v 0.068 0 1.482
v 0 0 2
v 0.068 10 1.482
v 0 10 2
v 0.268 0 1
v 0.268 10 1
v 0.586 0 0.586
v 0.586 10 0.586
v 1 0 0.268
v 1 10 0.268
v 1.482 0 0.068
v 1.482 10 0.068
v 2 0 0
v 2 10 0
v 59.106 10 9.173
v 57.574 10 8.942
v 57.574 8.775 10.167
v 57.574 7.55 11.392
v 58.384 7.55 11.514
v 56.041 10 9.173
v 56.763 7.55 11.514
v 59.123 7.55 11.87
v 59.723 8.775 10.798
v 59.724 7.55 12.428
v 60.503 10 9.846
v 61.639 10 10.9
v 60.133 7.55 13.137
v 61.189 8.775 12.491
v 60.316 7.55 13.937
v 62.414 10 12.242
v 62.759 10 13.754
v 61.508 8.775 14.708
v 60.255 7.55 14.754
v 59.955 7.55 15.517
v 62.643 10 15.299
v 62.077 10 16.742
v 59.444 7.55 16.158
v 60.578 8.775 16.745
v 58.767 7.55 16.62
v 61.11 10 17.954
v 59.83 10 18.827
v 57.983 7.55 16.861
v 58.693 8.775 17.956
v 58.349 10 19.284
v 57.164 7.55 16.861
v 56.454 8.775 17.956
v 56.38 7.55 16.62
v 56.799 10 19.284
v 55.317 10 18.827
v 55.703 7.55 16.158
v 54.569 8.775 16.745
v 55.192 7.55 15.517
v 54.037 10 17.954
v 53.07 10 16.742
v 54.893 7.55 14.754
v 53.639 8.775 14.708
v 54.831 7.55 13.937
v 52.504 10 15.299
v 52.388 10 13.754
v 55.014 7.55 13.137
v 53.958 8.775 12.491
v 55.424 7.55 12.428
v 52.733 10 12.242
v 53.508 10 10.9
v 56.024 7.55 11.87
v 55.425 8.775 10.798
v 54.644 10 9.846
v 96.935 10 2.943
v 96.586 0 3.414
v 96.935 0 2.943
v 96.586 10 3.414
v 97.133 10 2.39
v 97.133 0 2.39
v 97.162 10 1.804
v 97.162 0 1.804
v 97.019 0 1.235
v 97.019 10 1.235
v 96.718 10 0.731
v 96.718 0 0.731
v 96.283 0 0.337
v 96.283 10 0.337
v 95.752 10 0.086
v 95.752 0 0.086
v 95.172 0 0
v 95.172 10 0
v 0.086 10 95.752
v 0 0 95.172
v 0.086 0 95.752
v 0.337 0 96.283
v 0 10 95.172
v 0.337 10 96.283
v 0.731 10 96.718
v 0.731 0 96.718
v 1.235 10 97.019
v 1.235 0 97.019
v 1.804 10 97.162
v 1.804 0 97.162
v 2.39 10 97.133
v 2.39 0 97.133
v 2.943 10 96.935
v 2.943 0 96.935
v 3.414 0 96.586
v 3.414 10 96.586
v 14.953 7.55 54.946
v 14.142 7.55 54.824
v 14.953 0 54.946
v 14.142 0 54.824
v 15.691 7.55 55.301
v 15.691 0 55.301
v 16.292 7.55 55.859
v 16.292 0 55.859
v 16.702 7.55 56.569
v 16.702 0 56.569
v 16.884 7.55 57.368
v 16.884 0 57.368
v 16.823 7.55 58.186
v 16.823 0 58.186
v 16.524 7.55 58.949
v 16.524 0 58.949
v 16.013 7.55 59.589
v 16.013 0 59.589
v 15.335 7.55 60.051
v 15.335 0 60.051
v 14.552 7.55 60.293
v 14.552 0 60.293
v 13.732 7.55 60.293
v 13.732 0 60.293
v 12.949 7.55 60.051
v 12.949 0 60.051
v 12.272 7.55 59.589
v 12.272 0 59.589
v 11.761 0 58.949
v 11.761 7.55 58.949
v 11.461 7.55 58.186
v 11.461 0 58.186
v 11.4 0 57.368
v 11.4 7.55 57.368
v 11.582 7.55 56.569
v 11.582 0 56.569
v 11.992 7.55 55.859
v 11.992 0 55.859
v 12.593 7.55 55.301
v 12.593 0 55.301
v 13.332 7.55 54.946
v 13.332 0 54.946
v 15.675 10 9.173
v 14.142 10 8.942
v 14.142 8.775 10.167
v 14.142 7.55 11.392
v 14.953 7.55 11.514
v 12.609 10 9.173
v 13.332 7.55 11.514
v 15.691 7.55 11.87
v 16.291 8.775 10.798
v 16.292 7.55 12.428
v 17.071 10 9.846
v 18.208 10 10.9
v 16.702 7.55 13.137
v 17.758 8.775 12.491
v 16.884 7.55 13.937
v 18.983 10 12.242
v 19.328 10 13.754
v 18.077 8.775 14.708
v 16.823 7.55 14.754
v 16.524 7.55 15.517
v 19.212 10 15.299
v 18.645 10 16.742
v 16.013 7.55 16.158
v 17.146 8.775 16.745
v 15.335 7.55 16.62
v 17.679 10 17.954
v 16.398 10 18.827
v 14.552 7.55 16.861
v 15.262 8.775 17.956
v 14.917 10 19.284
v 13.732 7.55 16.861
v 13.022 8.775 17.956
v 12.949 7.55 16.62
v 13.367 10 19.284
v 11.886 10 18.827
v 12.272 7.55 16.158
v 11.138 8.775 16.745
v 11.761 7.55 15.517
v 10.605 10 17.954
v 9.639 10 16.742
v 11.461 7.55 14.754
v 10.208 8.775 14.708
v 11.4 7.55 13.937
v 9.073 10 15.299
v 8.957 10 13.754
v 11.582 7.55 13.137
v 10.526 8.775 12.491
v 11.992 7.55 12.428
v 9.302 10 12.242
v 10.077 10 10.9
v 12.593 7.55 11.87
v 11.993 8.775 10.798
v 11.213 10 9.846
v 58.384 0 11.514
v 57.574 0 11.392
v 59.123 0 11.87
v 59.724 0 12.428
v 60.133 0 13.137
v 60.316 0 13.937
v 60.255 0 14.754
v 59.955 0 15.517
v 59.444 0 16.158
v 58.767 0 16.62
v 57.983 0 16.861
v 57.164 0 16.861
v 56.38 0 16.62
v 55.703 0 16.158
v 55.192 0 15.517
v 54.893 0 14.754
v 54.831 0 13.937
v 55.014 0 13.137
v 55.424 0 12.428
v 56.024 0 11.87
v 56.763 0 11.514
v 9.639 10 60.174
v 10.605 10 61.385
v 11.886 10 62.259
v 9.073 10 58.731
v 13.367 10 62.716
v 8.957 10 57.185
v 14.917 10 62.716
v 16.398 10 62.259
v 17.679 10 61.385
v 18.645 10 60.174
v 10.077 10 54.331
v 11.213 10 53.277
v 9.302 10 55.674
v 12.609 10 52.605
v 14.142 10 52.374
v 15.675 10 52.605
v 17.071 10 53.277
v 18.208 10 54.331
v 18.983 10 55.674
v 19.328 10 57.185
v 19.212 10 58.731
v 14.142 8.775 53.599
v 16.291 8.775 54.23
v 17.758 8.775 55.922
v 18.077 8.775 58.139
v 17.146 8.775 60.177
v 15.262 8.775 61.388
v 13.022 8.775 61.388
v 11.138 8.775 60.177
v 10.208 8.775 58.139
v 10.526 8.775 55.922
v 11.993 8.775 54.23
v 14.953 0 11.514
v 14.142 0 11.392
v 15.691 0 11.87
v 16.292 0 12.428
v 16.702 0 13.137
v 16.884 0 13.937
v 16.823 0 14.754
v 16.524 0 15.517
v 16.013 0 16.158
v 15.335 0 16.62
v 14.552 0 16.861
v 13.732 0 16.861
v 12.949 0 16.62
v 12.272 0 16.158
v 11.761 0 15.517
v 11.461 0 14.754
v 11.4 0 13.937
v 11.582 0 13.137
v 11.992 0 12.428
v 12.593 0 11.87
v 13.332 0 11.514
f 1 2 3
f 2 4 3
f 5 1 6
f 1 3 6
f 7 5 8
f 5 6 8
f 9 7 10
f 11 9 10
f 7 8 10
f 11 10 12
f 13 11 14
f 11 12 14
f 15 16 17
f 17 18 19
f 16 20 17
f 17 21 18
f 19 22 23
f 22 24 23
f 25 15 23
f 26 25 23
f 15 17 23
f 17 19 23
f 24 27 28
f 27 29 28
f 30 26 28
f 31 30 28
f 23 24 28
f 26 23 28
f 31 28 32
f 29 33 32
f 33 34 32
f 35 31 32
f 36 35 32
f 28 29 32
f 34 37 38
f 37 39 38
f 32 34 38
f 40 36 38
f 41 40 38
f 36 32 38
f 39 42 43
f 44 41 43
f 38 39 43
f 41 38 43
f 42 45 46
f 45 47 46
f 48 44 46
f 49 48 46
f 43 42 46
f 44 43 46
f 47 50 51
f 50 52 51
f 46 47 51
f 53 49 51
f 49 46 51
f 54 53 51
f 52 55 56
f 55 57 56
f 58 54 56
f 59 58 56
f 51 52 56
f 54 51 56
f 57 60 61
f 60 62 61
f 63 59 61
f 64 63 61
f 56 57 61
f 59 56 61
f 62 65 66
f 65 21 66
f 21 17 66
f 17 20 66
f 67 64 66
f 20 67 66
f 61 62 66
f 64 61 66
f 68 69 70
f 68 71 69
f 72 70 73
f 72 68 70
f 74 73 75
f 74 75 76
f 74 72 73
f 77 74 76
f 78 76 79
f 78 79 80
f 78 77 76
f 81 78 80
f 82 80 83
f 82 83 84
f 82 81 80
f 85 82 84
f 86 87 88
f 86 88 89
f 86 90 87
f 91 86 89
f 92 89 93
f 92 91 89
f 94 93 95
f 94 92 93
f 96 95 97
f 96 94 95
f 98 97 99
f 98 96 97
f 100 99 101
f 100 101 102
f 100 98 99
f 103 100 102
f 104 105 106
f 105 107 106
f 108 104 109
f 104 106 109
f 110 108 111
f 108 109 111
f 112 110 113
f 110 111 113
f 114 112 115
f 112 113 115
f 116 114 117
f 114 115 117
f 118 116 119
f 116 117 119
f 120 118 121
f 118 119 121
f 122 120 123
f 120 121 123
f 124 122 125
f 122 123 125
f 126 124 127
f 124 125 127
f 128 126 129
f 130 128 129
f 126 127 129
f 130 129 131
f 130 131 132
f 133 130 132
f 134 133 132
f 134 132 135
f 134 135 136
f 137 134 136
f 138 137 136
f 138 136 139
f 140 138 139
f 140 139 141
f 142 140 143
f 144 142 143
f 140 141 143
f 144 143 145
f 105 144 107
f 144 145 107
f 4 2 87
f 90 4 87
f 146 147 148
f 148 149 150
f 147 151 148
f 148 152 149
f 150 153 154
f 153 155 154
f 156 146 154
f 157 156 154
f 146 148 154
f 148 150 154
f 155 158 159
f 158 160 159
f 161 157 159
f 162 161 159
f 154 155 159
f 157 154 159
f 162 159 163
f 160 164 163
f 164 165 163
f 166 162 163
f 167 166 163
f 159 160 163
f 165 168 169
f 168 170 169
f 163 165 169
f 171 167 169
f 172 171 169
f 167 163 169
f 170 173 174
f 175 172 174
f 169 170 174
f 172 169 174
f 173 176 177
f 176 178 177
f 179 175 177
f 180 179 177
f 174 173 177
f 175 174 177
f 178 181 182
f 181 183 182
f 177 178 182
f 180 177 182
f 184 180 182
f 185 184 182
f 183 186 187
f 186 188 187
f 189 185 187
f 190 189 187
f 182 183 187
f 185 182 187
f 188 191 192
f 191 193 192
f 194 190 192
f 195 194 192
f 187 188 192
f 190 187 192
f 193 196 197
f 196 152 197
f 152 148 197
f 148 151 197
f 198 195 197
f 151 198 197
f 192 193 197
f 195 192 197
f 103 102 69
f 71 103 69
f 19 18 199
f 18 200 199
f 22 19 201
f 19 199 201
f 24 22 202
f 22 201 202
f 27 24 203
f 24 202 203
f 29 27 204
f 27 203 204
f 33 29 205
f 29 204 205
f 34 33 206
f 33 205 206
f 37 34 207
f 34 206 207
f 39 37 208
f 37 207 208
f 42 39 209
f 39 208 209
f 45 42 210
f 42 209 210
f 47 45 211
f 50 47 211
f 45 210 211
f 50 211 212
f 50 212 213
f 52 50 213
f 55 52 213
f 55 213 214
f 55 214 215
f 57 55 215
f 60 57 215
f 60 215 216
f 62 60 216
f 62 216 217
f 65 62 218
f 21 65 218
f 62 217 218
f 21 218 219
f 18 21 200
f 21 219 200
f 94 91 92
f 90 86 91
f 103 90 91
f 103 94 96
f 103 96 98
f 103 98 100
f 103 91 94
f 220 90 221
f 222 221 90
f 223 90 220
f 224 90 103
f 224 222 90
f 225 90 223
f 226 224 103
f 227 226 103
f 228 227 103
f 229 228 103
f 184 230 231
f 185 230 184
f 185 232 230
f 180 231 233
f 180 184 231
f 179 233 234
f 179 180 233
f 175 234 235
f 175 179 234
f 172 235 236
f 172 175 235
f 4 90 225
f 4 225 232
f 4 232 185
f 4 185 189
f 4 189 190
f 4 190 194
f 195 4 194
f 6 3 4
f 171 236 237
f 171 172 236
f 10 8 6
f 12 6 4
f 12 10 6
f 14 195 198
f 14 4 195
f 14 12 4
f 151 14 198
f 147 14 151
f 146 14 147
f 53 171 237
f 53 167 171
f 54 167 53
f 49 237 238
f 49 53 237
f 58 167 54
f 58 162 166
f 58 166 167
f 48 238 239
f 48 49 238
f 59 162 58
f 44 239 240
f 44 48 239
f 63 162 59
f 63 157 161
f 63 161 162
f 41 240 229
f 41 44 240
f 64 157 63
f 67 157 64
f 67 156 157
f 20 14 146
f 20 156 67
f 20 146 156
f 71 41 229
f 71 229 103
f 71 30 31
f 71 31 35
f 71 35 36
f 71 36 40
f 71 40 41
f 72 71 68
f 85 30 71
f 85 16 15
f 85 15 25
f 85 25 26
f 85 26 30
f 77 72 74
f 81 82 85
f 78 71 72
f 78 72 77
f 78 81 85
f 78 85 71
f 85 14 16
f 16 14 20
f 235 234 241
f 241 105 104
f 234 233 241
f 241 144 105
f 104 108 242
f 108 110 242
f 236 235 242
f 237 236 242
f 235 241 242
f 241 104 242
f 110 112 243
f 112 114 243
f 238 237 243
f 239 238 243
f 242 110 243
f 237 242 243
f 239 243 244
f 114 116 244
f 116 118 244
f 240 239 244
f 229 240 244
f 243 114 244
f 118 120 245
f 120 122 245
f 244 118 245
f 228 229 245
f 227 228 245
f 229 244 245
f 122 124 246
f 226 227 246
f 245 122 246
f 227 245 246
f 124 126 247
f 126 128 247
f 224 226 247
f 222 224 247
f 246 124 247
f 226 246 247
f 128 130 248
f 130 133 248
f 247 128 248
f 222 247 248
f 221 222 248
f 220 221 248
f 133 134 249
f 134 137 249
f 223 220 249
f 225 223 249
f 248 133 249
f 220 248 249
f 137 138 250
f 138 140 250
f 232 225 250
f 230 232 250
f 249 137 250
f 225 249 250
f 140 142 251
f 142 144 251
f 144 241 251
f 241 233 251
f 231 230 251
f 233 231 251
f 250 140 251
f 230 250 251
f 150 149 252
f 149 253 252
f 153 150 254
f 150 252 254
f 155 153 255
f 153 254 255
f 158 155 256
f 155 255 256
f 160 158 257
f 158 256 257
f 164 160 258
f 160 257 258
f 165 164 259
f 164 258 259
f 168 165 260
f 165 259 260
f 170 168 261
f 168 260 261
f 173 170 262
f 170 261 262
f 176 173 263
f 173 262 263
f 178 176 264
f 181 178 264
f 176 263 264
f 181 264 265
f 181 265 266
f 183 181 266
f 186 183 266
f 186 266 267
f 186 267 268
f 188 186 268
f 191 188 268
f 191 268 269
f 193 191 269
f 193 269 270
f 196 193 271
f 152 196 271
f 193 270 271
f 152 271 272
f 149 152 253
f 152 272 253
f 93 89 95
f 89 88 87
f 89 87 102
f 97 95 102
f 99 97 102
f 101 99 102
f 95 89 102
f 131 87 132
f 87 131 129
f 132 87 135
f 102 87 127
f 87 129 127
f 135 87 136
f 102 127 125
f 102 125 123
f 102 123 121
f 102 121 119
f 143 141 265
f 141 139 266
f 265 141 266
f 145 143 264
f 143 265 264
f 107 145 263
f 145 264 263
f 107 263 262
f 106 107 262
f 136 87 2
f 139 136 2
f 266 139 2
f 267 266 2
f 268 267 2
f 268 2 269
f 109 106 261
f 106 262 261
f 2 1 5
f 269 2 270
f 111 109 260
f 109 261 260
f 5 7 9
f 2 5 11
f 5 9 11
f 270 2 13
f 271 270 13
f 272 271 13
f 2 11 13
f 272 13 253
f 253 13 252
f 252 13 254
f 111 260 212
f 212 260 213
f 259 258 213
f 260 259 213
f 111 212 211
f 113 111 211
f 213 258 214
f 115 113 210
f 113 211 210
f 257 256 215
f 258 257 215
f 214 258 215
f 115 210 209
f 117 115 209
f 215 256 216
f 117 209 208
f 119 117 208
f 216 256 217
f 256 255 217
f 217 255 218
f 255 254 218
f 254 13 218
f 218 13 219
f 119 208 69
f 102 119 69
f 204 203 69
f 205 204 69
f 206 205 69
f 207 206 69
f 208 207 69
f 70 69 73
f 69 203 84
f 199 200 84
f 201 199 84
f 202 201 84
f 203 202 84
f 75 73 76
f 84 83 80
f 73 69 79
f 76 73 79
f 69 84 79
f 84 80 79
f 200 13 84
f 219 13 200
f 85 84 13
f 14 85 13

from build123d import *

# Parameters (mm, degrees)
BOSS_EXTRUDE1_DEPTH                             = 10
CSK_FOR_M5_FLAT_HEAD_MACHINE_SCREW1_D           = 5.5
CSK_FOR_M5_FLAT_HEAD_MACHINE_SCREW1_CSINK_D     = 10.4
CSK_FOR_M5_FLAT_HEAD_MACHINE_SCREW1_CSINK_ANGLE = 90
FILLET2_R                                       = 2


with BuildPart() as part:
    # Sketch1 → Boss-Extrude1 (new body)
    with BuildSketch(Plane(origin=(0, 0, 0), x_dir=(1, 0, 0), z_dir=(0, 1, 0))):
        Polygon((0, 0), (0, -100), (100, 0), align=None)
    extrude(amount=BOSS_EXTRUDE1_DEPTH)

    # CSK for M5 Flat Head Machine Screw1 (through all)
    with Locations(Plane(origin=(14.142135624, 10, 14.142135624), x_dir=(0, 0, 1), z_dir=(0, 1, 0))):
        with Locations((0, 0), (43.431457505, 0), (0, 43.431457505)):
            CounterSinkHole(CSK_FOR_M5_FLAT_HEAD_MACHINE_SCREW1_D / 2, CSK_FOR_M5_FLAT_HEAD_MACHINE_SCREW1_CSINK_D / 2, counter_sink_angle=CSK_FOR_M5_FLAT_HEAD_MACHINE_SCREW1_CSINK_ANGLE)

    # Fillet2
    fillet2_edges = [part.edges().sort_by_distance(p)[0] for p in [
        (100, 5, 0),
        (0, 5, 100),
        (0, 5, 0),
    ]]
    fillet(fillet2_edges, radius=FILLET2_R)


solid = part.part
